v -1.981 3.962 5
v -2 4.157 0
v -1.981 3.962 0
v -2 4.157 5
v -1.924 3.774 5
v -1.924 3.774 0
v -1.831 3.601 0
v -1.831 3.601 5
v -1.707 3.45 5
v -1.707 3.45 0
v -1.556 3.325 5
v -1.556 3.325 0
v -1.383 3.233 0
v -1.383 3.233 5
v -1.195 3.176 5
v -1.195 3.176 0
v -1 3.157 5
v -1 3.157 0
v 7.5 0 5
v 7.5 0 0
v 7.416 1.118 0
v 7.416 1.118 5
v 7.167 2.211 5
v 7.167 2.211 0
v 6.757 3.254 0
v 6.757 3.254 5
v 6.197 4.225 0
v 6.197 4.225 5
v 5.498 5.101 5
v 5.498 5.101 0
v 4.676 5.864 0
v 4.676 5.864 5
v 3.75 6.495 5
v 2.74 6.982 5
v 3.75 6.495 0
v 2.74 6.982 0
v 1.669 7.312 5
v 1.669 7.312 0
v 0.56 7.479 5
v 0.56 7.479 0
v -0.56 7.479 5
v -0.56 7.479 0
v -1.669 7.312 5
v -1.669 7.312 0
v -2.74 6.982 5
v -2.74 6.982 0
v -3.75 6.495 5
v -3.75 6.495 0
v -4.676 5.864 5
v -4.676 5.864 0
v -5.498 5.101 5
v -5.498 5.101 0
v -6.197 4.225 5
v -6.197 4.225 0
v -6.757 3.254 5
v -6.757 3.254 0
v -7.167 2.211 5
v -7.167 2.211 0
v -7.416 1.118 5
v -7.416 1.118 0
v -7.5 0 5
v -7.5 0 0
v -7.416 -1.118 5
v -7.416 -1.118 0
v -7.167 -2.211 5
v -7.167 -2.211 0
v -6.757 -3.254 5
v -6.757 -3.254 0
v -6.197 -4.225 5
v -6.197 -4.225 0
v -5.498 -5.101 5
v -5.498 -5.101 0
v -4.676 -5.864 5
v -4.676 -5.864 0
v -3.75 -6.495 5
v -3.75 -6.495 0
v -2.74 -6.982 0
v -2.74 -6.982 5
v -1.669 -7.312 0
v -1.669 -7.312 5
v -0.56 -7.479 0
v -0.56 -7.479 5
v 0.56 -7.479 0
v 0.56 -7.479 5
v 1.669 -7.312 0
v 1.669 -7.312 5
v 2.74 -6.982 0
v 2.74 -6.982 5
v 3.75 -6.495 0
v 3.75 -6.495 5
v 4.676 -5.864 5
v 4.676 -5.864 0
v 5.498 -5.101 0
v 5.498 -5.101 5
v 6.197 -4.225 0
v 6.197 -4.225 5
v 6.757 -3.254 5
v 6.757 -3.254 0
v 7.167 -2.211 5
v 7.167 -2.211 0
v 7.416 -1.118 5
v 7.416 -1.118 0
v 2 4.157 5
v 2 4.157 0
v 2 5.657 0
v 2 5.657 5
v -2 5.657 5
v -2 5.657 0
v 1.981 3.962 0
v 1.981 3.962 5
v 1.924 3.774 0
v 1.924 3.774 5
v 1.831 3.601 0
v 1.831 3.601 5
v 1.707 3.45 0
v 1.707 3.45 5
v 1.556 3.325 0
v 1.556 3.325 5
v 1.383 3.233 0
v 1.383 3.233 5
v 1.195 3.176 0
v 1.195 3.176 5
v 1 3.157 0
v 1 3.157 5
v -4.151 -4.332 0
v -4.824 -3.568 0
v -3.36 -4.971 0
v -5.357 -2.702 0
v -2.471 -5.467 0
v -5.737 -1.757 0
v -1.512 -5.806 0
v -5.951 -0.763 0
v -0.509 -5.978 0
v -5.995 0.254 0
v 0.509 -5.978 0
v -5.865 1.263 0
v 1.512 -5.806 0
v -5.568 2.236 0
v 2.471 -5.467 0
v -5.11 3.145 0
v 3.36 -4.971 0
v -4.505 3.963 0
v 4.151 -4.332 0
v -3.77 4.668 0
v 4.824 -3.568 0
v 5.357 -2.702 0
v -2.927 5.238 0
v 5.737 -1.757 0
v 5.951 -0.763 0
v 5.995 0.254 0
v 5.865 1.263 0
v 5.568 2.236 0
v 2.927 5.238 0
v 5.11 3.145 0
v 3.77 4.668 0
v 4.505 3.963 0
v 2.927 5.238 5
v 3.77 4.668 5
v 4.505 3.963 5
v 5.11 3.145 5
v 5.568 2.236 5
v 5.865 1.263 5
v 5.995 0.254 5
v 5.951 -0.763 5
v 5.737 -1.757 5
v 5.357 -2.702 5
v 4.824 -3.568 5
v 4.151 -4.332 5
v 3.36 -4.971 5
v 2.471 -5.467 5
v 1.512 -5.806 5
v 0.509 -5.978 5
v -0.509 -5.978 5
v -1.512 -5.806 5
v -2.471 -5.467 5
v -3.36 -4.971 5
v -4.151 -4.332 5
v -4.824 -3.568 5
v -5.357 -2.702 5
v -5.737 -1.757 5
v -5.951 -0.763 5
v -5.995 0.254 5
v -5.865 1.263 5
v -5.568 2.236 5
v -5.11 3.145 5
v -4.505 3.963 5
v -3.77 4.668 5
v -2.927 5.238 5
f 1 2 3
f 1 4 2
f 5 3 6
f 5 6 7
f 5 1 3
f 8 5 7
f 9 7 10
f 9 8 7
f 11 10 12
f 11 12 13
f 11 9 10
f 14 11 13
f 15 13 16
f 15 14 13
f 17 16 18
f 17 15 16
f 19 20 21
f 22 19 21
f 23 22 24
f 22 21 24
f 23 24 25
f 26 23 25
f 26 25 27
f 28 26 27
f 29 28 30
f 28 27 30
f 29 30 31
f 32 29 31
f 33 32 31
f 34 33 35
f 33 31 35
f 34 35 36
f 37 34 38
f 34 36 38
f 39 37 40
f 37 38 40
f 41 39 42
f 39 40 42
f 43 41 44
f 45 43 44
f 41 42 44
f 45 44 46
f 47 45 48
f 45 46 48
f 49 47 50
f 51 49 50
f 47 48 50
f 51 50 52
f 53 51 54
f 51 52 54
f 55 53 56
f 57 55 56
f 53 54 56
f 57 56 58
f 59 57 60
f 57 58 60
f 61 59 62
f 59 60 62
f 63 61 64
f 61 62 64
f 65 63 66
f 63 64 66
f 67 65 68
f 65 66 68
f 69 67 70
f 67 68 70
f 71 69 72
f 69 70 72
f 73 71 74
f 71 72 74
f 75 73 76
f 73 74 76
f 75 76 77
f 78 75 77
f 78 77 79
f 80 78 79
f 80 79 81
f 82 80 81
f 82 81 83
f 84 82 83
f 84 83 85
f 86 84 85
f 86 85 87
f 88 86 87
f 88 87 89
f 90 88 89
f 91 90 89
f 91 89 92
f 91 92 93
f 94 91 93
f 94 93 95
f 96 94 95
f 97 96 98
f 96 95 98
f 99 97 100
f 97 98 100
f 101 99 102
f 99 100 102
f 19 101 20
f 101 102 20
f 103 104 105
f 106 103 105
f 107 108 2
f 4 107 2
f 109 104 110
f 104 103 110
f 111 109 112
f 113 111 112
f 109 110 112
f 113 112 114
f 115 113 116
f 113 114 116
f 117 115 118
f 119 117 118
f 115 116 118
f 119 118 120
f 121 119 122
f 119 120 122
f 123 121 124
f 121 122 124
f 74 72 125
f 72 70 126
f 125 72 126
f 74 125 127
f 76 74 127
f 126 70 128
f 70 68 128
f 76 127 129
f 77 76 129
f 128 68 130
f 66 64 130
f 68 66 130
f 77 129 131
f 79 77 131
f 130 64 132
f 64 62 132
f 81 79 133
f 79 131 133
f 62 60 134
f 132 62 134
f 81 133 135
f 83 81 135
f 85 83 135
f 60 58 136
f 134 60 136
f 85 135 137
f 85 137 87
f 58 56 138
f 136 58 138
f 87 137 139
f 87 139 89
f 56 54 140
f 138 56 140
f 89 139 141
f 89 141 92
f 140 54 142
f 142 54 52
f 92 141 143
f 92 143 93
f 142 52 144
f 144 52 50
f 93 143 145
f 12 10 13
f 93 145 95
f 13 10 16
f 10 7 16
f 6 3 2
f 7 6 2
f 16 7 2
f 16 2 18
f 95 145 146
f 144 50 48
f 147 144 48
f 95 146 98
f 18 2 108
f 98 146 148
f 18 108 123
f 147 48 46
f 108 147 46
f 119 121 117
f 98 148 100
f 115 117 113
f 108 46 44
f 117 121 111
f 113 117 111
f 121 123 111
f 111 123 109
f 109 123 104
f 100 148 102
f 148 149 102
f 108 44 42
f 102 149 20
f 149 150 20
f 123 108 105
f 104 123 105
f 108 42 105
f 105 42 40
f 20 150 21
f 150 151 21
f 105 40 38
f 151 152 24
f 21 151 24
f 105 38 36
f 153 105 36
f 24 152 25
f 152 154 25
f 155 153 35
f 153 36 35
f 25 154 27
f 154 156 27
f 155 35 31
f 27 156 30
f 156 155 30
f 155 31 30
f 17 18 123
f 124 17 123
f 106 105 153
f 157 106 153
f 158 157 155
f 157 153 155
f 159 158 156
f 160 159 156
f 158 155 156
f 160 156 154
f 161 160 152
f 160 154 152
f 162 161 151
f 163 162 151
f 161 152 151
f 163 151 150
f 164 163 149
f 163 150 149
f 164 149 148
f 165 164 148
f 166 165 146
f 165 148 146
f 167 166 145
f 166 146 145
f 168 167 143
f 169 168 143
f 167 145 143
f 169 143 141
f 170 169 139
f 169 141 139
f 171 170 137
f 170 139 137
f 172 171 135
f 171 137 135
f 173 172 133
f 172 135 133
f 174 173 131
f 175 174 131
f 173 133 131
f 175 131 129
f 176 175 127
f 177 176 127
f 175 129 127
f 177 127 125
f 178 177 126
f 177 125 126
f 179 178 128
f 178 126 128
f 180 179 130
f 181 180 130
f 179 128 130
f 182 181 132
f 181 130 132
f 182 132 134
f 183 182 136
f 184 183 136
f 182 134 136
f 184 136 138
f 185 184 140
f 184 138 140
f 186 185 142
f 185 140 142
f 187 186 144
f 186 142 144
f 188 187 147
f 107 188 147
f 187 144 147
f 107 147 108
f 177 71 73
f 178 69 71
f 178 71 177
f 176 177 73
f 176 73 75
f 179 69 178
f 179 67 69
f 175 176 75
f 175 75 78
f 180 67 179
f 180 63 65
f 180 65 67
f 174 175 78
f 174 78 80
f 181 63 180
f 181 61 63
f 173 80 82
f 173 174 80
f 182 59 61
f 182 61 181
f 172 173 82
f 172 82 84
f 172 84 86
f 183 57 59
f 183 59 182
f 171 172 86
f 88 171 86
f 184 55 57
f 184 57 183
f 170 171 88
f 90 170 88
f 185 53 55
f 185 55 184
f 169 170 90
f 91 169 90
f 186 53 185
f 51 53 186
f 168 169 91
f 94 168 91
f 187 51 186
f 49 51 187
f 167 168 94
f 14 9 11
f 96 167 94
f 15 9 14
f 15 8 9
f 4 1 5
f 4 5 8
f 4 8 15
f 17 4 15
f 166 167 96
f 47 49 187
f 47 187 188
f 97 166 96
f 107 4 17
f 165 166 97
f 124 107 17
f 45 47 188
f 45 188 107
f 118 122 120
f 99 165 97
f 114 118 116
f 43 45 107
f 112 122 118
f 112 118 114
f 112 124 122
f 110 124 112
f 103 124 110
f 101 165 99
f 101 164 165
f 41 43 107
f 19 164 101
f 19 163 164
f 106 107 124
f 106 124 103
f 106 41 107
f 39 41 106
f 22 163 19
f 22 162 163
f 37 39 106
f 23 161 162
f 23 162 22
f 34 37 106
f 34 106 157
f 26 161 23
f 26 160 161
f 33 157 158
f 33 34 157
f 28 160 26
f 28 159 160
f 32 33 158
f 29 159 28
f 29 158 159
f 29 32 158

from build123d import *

# Parameters (mm, degrees)
SKETCH2_R           = 7.5
BOSS_EXTRUDE1_DEPTH = 5
FILLET1_R           = 1


with BuildPart() as part:
    # Sketch2 → Boss-Extrude1 (new body)
    with BuildSketch(Plane.XY):
        Circle(SKETCH2_R)
        with BuildLine():
            Line((-2, 3.156854249), (2, 3.156854249))
            Line((2, 3.156854249), (2, 5.656854249))
            ThreePointArc((2, 5.656854249), (0, -6), (-2, 5.656854249))
            Line((-2, 5.656854249), (-2, 3.156854249))
        make_face(mode=Mode.SUBTRACT)
    extrude(amount=BOSS_EXTRUDE1_DEPTH)

    # Fillet1
    fillet1_edges = [part.edges().sort_by_distance(p)[0] for p in [
        (-2, 3.156854249, 2.5),
        (2, 3.156854249, 2.5),
    ]]
    fillet(fillet1_edges, radius=FILLET1_R)


solid = part.part
